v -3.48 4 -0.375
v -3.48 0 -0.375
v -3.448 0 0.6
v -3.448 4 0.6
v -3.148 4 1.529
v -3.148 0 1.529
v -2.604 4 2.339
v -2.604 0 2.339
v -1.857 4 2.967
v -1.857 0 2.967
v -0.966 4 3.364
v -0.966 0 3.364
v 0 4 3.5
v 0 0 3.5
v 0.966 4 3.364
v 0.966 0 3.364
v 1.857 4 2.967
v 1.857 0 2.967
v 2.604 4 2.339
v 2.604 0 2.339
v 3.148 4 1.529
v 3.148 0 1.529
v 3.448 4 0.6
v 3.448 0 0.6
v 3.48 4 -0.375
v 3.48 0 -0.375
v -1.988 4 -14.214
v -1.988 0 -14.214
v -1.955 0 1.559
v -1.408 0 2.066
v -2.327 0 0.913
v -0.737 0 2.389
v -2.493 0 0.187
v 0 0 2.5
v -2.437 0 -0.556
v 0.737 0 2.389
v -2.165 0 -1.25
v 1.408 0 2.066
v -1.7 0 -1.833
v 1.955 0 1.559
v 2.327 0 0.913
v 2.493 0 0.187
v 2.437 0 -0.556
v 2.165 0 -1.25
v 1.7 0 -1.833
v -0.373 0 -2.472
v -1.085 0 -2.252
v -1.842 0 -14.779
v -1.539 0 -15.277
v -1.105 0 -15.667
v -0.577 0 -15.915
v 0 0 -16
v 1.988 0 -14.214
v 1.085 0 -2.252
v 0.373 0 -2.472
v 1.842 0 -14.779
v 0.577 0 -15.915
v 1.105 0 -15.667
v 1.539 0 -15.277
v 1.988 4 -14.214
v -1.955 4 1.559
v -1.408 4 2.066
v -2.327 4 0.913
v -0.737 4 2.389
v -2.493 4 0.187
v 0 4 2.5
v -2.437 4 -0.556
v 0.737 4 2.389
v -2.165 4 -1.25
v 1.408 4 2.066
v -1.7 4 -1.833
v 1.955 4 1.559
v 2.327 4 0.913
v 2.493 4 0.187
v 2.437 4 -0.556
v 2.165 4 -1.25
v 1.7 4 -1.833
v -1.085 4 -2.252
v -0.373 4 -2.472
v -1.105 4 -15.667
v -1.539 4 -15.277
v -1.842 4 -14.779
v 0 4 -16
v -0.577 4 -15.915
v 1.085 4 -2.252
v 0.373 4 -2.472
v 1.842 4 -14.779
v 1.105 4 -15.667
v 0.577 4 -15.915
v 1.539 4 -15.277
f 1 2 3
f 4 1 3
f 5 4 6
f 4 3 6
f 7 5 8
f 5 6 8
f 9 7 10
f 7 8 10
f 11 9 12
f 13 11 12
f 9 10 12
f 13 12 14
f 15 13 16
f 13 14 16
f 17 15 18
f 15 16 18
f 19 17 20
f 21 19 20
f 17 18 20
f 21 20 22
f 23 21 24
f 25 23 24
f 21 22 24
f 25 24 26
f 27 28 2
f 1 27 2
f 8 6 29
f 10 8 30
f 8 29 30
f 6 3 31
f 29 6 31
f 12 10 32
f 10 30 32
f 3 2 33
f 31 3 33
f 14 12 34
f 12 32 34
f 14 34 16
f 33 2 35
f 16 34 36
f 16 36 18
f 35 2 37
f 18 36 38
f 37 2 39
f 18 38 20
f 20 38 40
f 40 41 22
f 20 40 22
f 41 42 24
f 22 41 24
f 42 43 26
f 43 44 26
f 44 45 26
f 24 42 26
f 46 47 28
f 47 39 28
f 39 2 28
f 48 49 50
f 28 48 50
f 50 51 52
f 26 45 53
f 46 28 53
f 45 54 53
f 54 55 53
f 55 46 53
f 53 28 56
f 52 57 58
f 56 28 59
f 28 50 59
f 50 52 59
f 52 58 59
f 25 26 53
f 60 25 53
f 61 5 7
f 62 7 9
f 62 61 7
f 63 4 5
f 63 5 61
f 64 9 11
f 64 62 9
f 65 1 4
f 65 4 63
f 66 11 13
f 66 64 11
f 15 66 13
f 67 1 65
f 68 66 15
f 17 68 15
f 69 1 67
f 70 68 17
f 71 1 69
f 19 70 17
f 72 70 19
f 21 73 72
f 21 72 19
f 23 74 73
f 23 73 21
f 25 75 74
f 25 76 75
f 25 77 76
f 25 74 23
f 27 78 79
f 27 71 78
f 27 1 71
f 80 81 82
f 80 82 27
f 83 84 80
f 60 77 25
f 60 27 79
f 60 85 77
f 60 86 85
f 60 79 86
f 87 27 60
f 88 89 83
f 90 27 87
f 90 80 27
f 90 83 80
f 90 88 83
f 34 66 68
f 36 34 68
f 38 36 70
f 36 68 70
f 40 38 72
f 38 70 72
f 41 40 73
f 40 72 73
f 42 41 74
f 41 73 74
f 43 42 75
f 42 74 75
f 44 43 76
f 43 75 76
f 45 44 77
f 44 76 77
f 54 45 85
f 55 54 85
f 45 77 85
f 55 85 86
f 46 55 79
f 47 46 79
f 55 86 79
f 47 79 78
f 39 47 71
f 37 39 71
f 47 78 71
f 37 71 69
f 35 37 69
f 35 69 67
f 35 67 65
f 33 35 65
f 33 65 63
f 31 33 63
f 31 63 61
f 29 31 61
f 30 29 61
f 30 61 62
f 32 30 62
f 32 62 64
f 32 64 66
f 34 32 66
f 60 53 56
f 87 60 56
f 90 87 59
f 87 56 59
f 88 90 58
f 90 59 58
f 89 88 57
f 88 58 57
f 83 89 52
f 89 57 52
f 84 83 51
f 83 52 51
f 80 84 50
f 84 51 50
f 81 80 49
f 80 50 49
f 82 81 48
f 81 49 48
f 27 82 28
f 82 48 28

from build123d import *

# Parameters (mm, degrees)
EXTRUDE_1_DEPTH     = 4
CUT_EXTRUDE_1_REACH = 18.86
SKETCH_2_R          = 2.5


with BuildPart() as part:
    # 草图1 → 凸台-拉伸1 (new body)
    with BuildSketch(Plane(origin=(0, 0, 0), x_dir=(1, 0, 0), z_dir=(0, 1, 0))):
        with BuildLine():
            Line((3.479852727, 0.375), (1.988487272, 14.214285714))
            ThreePointArc((1.988487272, 14.214285714), (0, 16), (-1.988487272, 14.214285714))
            Line((-1.988487272, 14.214285714), (-3.479852727, 0.375))
            ThreePointArc((-3.479852727, 0.375), (0, -3.5), (3.479852727, 0.375))
        make_face()
    extrude(amount=EXTRUDE_1_DEPTH)

    # 草图2 → 切除-拉伸1 (cut, up to next)
    with BuildSketch(Plane(origin=(0, 4, 0), x_dir=(1, 0, 0), z_dir=(0, 1, 0)), mode=Mode.PRIVATE) as cut_extrude_1_sk1:
        with Locations(Location((0, 0, 0), (0, 0, 270))):
            Circle(SKETCH_2_R)
    cut_extrude_1_tool1 = extrude(cut_extrude_1_sk1.sketch, amount=-CUT_EXTRUDE_1_REACH, mode=Mode.PRIVATE) & part.part
    add(cut_extrude_1_tool1.solids().sort_by_distance((0, 4, 0))[0], mode=Mode.SUBTRACT)


solid = part.part
